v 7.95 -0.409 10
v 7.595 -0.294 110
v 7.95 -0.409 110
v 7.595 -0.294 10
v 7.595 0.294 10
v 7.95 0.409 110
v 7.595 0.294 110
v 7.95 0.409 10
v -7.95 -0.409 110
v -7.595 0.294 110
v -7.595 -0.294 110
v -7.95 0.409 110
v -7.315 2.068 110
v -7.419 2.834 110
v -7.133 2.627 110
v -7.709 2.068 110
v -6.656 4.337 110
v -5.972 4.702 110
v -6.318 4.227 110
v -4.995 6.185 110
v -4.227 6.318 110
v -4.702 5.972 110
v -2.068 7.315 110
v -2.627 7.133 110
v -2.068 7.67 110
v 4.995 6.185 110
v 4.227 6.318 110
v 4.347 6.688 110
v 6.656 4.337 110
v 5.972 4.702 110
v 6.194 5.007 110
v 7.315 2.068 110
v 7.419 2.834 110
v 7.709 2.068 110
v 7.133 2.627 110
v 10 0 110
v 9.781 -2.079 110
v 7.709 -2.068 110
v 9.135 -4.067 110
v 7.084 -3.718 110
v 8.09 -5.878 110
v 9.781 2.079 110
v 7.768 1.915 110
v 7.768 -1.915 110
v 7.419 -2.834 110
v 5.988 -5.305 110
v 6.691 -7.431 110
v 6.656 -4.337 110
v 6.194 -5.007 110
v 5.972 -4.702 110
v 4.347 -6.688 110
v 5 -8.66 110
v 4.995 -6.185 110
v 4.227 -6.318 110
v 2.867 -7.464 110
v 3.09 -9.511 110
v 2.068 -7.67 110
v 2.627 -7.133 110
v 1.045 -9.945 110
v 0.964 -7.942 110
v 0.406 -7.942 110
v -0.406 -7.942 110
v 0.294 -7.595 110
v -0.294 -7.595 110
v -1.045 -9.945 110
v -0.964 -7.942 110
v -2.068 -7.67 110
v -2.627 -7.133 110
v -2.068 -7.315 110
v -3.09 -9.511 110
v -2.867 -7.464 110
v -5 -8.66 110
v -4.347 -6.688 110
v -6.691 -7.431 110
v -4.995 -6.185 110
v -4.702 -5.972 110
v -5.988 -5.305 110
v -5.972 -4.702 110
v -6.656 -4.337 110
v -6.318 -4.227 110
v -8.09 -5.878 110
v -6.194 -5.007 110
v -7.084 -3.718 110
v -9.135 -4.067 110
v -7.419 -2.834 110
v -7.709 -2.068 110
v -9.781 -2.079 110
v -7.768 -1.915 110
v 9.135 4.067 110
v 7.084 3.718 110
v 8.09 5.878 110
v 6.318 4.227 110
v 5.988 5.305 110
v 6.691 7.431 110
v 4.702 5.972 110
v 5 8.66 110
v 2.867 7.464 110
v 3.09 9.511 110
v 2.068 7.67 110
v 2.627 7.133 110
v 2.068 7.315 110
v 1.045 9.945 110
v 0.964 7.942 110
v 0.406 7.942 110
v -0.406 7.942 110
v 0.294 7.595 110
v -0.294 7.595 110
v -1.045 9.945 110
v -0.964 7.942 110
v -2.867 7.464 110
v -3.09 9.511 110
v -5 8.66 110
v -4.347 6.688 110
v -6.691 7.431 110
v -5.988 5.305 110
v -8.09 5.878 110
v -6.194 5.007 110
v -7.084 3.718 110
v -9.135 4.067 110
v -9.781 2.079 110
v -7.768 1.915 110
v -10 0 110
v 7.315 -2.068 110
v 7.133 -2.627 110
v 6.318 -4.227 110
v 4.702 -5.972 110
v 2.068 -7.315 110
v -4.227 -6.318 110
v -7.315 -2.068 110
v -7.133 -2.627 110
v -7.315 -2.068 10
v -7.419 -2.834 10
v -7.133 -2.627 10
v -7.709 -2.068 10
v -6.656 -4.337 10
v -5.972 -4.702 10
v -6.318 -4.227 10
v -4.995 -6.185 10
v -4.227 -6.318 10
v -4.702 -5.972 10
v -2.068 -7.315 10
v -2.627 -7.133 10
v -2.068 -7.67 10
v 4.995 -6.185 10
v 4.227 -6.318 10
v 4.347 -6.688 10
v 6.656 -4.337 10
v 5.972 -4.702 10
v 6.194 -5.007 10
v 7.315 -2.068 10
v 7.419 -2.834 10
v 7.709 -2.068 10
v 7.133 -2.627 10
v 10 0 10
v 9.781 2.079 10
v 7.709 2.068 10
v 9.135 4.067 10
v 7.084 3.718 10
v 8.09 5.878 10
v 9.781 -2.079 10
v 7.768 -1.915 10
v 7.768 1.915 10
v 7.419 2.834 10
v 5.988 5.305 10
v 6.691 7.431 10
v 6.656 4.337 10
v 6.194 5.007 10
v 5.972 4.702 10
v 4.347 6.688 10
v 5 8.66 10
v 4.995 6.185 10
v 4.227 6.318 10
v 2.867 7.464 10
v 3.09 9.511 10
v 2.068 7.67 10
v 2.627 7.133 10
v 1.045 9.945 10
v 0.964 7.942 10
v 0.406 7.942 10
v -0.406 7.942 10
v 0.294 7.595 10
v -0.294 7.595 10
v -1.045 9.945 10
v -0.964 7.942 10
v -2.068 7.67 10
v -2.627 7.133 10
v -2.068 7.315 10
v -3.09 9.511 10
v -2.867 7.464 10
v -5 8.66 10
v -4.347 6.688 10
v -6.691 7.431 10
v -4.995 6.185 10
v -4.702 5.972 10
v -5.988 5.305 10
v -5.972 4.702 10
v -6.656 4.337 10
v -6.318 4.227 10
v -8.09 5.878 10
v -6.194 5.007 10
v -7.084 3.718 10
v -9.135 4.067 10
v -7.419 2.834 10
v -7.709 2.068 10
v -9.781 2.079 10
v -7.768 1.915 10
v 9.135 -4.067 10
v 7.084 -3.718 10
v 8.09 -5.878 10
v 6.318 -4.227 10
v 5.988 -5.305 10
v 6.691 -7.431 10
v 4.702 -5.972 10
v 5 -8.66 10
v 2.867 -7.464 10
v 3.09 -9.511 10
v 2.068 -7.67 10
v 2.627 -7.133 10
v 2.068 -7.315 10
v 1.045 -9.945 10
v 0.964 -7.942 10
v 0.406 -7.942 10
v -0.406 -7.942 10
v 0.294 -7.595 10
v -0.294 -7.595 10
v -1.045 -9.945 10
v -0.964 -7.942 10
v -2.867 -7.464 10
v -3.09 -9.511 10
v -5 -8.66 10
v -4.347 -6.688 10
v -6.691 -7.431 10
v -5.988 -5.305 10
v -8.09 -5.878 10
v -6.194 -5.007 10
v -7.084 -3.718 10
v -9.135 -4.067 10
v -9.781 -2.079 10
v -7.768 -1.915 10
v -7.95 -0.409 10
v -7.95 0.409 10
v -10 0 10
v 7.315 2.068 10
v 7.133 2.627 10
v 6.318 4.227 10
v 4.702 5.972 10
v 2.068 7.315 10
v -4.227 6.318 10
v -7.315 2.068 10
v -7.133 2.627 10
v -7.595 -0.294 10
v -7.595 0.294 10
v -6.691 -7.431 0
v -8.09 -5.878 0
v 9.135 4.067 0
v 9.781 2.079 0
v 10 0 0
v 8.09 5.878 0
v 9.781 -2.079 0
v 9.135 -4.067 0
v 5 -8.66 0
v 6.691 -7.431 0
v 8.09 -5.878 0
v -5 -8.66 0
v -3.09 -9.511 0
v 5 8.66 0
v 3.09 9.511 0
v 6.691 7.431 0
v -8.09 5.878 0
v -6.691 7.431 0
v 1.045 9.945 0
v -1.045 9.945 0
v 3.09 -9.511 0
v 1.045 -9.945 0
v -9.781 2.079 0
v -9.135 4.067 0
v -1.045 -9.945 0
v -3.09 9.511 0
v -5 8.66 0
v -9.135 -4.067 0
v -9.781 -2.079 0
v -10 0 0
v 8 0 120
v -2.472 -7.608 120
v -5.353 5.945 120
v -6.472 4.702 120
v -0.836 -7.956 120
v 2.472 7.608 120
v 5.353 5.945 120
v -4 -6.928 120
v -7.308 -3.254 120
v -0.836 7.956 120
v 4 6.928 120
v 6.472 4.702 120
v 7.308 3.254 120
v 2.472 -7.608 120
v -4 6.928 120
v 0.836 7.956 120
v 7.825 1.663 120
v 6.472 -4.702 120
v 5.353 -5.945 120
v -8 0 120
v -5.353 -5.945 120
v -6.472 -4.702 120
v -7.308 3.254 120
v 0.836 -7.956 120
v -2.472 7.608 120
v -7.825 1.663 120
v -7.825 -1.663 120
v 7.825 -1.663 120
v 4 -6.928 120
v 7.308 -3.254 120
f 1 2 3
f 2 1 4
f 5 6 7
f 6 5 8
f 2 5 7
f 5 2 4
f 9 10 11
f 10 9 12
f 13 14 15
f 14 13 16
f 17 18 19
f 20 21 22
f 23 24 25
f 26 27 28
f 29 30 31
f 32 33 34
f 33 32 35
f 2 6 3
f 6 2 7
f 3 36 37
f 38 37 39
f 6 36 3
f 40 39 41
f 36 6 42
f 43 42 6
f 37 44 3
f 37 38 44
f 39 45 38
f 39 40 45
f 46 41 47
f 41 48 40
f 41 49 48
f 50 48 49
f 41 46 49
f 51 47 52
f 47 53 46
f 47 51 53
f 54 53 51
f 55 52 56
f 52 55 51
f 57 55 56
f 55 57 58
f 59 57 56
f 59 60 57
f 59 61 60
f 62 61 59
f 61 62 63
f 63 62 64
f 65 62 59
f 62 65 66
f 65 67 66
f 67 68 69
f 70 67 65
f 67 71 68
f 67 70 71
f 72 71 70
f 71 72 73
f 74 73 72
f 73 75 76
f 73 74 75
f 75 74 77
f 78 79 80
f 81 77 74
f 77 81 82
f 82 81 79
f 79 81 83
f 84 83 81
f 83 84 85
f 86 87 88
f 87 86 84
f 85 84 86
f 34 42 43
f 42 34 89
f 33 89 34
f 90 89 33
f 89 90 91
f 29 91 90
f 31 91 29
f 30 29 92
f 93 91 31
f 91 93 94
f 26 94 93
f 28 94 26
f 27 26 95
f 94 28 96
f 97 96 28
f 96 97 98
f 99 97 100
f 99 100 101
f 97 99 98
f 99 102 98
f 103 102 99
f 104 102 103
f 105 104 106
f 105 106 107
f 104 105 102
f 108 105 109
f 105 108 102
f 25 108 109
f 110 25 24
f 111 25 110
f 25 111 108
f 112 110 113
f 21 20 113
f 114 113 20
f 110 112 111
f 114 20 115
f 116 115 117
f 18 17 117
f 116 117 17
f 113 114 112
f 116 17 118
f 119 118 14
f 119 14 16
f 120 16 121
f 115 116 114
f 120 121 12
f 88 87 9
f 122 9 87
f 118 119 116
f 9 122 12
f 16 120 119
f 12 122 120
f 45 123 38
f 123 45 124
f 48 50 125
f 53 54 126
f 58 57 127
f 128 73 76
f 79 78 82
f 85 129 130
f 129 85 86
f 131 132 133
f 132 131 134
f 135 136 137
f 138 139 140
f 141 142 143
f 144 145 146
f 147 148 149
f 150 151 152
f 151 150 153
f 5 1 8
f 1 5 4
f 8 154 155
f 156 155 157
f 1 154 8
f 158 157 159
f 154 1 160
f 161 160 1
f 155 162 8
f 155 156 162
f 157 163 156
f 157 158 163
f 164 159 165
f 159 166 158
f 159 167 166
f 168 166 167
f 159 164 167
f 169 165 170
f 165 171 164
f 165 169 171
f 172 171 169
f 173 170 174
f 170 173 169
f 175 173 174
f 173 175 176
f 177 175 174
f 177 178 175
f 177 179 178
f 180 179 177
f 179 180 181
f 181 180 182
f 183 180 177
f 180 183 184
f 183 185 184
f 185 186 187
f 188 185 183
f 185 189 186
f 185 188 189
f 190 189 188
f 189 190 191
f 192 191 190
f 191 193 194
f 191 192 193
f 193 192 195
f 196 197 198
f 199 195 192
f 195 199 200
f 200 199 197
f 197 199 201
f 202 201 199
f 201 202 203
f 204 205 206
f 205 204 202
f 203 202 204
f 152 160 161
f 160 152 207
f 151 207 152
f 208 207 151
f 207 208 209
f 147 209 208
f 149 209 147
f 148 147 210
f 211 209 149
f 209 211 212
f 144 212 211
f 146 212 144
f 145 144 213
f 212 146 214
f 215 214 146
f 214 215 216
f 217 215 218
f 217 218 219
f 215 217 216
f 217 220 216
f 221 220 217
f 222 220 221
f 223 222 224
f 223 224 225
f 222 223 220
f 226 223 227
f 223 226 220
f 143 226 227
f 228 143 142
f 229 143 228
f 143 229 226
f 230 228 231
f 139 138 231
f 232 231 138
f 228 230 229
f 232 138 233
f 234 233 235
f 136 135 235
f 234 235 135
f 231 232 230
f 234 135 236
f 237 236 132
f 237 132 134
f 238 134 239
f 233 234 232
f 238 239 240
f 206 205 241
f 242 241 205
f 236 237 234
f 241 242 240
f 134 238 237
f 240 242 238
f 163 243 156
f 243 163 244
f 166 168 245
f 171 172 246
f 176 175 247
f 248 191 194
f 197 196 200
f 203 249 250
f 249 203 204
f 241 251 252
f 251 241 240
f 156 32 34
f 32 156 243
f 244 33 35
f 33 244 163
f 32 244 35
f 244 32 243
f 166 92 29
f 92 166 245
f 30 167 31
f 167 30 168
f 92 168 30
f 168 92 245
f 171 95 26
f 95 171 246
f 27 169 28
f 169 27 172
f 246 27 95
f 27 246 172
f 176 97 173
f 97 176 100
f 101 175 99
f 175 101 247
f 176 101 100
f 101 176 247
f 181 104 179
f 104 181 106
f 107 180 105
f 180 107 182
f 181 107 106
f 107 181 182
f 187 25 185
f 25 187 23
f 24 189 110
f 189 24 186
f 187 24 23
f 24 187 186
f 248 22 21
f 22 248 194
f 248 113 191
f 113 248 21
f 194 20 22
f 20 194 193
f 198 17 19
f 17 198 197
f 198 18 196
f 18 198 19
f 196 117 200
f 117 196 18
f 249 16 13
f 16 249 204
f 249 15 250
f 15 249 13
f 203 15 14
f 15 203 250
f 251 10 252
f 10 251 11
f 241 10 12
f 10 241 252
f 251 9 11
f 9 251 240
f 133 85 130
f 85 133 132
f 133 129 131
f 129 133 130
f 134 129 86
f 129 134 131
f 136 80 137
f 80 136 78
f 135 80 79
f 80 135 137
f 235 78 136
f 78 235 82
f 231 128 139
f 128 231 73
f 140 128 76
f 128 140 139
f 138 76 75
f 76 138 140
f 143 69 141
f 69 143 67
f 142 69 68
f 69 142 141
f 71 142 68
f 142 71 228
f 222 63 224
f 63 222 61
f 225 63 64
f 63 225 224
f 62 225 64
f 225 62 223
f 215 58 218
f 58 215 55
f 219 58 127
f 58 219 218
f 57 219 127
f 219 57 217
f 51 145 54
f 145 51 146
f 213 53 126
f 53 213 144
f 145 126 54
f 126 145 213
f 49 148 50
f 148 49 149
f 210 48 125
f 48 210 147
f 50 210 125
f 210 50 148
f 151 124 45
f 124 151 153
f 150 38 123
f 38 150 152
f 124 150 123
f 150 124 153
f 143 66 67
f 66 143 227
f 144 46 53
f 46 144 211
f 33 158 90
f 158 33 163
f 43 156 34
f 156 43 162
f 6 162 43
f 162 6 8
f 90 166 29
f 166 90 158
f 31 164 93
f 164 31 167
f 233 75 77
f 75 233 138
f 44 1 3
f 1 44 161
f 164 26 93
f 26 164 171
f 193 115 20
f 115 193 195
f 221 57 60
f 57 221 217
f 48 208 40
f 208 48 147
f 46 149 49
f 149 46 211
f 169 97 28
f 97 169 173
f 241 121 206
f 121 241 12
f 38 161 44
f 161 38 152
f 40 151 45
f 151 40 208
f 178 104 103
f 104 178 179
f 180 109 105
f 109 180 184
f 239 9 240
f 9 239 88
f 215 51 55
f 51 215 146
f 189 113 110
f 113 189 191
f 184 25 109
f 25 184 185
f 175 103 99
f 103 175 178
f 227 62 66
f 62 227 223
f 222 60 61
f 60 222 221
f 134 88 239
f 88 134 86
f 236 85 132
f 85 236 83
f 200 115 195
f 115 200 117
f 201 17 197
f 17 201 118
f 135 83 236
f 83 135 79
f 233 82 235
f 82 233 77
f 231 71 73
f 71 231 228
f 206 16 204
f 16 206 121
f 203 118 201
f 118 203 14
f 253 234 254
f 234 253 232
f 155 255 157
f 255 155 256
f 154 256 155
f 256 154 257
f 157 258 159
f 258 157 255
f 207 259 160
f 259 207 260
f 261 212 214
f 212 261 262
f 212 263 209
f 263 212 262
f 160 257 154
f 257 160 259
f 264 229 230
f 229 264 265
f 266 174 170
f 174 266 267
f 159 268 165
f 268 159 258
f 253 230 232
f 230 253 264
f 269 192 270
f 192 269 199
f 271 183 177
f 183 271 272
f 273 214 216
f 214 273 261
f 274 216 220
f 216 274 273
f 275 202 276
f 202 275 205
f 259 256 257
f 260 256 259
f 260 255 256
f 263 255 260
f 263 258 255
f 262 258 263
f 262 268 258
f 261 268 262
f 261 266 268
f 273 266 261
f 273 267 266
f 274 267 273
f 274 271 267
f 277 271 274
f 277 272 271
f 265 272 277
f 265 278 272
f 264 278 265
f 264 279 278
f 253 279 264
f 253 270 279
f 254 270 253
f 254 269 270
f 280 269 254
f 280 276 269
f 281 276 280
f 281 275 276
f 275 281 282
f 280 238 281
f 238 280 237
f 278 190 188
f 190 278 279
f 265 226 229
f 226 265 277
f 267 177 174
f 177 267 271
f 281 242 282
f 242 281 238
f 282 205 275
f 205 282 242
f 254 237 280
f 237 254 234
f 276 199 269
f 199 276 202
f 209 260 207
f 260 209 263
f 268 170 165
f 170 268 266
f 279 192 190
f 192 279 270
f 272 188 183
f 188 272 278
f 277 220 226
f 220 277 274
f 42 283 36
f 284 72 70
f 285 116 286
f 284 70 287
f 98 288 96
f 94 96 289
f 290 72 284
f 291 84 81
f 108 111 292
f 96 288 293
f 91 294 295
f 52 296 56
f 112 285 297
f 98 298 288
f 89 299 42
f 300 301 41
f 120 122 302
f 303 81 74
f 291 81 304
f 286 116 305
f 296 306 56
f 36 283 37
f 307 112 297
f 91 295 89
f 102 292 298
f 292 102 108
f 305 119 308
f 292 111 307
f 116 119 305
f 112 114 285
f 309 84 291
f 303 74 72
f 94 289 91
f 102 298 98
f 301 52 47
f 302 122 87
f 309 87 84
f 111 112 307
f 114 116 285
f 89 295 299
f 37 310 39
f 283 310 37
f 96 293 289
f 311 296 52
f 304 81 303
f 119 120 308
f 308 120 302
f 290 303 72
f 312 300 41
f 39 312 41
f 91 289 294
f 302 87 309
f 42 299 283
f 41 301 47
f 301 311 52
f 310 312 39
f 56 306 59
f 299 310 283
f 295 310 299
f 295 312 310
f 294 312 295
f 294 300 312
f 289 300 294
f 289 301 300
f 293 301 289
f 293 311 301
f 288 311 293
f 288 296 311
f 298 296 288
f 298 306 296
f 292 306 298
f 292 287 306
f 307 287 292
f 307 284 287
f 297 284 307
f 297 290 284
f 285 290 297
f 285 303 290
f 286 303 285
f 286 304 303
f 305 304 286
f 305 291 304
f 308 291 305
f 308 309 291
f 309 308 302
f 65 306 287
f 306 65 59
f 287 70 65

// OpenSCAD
// Parameters
base_radius = 10;
shaft_height = 100;
shaft_radius = 8;
capital_height = 10;
flute_count = 20;
flute_depth = 0.5;

// Column Function
module roman_pillar() {
    // Base
    cylinder(h = base_radius, r1 = base_radius, r2 = base_radius);

    // Shaft with flutes
    translate([0, 0, base_radius])
        shaft();

    // Capital
    translate([0, 0, base_radius + shaft_height])
        cylinder(h = capital_height, r1 = base_radius, r2 = shaft_radius);
}

// Shaft with flutes
module shaft() {
    difference() {
        cylinder(h = shaft_height, r = shaft_radius);
        for (i = [0 : 360 / flute_count : 360]) {
            rotate([0, 0, i]) {
                translate([shaft_radius, 0, 0])
                    cylinder(h = shaft_height, r1 = flute_depth, r2 = flute_depth);
            }
        }
    }
}

// Create the column
roman_pillar();
